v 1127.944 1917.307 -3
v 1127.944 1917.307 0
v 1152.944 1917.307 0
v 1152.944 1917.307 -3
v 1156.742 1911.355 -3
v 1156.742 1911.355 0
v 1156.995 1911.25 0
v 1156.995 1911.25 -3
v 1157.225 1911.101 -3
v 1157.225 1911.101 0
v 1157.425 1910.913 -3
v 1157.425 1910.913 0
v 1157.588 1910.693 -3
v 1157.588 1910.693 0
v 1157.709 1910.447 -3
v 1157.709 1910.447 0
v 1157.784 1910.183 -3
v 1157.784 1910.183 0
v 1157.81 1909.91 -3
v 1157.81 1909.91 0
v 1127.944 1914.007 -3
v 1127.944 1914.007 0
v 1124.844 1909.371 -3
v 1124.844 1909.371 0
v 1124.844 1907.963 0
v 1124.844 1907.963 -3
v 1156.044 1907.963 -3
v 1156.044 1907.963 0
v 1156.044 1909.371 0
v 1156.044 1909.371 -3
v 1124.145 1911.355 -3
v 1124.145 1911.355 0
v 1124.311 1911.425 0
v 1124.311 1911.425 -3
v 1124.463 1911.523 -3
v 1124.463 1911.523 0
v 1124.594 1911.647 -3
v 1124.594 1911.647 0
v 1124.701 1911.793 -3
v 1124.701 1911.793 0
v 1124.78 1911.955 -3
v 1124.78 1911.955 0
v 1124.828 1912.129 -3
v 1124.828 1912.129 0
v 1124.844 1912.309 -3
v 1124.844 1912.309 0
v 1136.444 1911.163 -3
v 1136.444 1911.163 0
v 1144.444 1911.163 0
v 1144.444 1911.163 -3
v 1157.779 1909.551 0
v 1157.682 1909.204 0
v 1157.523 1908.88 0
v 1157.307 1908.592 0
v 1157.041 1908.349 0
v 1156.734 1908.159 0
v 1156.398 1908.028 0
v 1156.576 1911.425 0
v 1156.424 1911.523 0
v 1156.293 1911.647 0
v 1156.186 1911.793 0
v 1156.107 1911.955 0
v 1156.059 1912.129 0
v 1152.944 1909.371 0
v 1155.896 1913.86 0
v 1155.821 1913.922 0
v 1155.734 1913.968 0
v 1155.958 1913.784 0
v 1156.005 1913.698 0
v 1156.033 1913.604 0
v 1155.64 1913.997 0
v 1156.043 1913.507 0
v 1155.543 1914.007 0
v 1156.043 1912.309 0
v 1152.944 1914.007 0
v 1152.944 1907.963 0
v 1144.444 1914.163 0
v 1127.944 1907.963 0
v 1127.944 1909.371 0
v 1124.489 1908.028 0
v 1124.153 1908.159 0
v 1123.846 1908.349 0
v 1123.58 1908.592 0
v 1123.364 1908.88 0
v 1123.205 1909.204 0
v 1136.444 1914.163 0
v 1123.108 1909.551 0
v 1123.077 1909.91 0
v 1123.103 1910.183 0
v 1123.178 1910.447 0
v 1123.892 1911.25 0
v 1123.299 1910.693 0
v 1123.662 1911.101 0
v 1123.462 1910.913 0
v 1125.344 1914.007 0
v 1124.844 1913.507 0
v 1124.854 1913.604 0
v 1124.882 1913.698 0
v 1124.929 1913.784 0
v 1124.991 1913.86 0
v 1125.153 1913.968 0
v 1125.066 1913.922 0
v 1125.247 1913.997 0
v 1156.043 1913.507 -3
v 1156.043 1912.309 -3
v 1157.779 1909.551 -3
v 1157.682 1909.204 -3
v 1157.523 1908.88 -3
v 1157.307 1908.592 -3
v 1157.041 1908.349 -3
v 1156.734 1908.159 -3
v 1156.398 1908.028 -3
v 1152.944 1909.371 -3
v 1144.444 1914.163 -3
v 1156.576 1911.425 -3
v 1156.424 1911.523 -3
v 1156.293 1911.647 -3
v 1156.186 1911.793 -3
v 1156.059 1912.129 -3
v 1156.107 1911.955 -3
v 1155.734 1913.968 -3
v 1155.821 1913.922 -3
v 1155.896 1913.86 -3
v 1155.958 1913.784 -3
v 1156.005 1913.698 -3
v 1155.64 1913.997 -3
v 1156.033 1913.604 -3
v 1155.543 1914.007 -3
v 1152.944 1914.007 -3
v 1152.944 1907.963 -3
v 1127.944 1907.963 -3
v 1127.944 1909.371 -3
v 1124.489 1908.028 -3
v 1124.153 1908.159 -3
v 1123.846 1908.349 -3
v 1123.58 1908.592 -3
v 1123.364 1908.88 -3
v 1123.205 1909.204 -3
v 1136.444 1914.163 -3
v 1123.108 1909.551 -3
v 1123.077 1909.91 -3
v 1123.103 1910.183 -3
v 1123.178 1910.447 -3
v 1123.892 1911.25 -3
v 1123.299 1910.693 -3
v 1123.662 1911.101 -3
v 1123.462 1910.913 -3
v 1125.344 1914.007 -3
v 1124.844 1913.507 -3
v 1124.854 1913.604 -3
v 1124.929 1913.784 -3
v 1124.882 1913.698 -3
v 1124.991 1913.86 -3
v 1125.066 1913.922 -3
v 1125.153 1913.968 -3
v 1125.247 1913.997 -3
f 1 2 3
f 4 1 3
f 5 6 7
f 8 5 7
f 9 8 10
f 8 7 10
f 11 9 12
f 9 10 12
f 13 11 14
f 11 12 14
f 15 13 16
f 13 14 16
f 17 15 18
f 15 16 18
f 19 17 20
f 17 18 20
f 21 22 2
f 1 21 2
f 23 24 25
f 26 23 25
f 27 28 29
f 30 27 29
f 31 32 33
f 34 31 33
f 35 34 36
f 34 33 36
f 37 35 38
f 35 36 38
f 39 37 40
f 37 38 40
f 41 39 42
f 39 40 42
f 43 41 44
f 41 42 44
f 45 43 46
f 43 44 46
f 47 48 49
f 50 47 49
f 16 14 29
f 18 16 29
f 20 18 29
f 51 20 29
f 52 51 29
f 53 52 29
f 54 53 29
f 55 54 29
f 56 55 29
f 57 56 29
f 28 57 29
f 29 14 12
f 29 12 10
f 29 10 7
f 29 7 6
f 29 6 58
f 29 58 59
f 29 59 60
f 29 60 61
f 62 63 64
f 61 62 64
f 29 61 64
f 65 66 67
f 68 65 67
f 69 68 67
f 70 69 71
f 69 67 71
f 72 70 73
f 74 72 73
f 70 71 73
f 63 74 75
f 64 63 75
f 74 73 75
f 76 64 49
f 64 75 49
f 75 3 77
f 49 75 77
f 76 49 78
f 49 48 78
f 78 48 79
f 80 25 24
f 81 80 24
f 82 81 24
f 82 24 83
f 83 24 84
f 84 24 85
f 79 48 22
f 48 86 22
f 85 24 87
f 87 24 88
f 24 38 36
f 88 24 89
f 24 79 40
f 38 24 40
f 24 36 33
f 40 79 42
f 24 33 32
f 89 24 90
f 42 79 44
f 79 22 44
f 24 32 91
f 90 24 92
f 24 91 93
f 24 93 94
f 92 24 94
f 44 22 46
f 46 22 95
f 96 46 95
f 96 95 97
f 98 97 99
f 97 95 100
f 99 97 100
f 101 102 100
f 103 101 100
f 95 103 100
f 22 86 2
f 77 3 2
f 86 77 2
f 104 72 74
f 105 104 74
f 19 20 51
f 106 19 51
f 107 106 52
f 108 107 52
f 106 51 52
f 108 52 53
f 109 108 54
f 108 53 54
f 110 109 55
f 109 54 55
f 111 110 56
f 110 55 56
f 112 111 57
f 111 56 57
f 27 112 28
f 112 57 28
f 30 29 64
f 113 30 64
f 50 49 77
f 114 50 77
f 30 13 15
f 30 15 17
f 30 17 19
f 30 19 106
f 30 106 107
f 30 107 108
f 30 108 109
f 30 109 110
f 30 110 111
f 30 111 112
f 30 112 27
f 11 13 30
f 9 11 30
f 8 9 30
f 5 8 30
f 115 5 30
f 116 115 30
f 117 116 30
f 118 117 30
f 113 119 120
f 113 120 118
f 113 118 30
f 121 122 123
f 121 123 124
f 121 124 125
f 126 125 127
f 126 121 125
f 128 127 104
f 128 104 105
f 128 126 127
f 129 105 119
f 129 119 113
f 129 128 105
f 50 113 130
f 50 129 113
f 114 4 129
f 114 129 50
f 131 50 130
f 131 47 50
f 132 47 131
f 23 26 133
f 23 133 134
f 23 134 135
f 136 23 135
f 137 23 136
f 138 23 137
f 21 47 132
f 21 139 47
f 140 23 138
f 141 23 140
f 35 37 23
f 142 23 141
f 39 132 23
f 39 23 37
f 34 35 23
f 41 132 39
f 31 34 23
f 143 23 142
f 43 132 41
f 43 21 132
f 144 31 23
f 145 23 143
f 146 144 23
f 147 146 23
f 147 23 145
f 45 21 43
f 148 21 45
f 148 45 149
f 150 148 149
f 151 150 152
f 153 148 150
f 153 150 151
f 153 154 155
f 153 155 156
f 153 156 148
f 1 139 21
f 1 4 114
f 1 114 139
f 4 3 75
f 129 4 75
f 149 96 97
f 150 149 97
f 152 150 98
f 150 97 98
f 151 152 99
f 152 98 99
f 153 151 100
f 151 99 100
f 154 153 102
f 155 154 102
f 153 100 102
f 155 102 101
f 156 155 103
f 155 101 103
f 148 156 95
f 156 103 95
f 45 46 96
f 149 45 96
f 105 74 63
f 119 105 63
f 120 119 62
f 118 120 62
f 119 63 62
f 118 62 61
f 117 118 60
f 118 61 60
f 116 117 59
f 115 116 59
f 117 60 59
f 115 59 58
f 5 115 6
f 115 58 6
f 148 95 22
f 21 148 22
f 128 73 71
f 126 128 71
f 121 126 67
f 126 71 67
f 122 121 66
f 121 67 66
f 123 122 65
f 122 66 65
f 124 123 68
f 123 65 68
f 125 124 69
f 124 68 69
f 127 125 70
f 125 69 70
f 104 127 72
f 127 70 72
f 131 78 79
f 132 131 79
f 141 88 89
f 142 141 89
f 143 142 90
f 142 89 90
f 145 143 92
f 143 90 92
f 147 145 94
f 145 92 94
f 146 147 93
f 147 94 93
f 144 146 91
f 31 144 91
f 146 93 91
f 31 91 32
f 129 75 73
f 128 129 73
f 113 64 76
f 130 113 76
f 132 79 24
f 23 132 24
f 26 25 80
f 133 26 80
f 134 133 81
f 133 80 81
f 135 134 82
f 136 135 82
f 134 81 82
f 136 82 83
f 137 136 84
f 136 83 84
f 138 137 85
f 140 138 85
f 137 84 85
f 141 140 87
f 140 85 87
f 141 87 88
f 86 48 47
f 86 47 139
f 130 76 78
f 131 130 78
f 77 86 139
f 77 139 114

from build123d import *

# Parameters (mm, degrees)
ESQUISSE1_W               = 8
ESQUISSE1_H               = 3
T_LE_DE_BASE_PLI_E1_DEPTH = 3


# Sheet-metal steps are written as plain solids
with BuildPart() as part:
    # Esquisse1 → Tôle de base pliée1 (new body)
    with BuildSketch(Plane.XY):
        with BuildLine():
            Line((1127.943508916, 1917.30650062), (1152.943508916, 1917.30650062))
            Line((1152.943508916, 1917.30650062), (1152.943508916, 1914.00650062))
            Line((1152.943508916, 1914.00650062), (1155.54275991, 1914.00650062))
            ThreePointArc((1155.54275991, 1914.00650062), (1155.896313301, 1913.860054011), (1156.04275991, 1913.50650062))
            Line((1156.04275991, 1913.50650062), (1156.04275991, 1912.309090129))
            ThreePointArc((1156.04275991, 1912.309090129), (1156.236433485, 1911.717619339), (1156.742435301, 1911.355253073))
            ThreePointArc((1156.742435301, 1911.355253073), (1157.511445693, 1910.806601852), (1157.810195296, 1909.910418936))
            ThreePointArc((1157.810195296, 1909.910418936), (1157.306705477, 1908.592046054), (1156.043508916, 1907.962805635))
            Line((1156.043508916, 1907.962805635), (1156.043508916, 1909.371416958))
            Line((1156.043508916, 1909.371416958), (1152.943508916, 1909.371416958))
            Line((1152.943508916, 1909.371416958), (1152.943508916, 1907.962805635))
            Line((1152.943508916, 1907.962805635), (1127.943508916, 1907.962805635))
            Line((1127.943508916, 1907.962805635), (1127.943508916, 1909.371416958))
            Line((1127.943508916, 1909.371416958), (1124.843508916, 1909.371416958))
            Line((1124.843508916, 1909.371416958), (1124.843508916, 1907.962805635))
            ThreePointArc((1124.843508916, 1907.962805635), (1123.580312356, 1908.592046054), (1123.076822537, 1909.910418936))
            ThreePointArc((1123.076822537, 1909.910418936), (1123.37557214, 1910.806601852), (1124.144582531, 1911.355253073))
            ThreePointArc((1124.144582531, 1911.355253073), (1124.650584348, 1911.717619339), (1124.844257922, 1912.309090129))
            Line((1124.844257922, 1912.309090129), (1124.844257922, 1913.50650062))
            ThreePointArc((1124.844257922, 1913.50650062), (1124.990704532, 1913.860054011), (1125.344257922, 1914.00650062))
            Line((1125.344257922, 1914.00650062), (1127.943508916, 1914.00650062))
            Line((1127.943508916, 1914.00650062), (1127.943508916, 1917.30650062))
        make_face()
        with Locations((1140.443508916, 1912.662805635)):
            Rectangle(ESQUISSE1_W, ESQUISSE1_H, mode=Mode.SUBTRACT)
    extrude(amount=-T_LE_DE_BASE_PLI_E1_DEPTH)


solid = part.part
